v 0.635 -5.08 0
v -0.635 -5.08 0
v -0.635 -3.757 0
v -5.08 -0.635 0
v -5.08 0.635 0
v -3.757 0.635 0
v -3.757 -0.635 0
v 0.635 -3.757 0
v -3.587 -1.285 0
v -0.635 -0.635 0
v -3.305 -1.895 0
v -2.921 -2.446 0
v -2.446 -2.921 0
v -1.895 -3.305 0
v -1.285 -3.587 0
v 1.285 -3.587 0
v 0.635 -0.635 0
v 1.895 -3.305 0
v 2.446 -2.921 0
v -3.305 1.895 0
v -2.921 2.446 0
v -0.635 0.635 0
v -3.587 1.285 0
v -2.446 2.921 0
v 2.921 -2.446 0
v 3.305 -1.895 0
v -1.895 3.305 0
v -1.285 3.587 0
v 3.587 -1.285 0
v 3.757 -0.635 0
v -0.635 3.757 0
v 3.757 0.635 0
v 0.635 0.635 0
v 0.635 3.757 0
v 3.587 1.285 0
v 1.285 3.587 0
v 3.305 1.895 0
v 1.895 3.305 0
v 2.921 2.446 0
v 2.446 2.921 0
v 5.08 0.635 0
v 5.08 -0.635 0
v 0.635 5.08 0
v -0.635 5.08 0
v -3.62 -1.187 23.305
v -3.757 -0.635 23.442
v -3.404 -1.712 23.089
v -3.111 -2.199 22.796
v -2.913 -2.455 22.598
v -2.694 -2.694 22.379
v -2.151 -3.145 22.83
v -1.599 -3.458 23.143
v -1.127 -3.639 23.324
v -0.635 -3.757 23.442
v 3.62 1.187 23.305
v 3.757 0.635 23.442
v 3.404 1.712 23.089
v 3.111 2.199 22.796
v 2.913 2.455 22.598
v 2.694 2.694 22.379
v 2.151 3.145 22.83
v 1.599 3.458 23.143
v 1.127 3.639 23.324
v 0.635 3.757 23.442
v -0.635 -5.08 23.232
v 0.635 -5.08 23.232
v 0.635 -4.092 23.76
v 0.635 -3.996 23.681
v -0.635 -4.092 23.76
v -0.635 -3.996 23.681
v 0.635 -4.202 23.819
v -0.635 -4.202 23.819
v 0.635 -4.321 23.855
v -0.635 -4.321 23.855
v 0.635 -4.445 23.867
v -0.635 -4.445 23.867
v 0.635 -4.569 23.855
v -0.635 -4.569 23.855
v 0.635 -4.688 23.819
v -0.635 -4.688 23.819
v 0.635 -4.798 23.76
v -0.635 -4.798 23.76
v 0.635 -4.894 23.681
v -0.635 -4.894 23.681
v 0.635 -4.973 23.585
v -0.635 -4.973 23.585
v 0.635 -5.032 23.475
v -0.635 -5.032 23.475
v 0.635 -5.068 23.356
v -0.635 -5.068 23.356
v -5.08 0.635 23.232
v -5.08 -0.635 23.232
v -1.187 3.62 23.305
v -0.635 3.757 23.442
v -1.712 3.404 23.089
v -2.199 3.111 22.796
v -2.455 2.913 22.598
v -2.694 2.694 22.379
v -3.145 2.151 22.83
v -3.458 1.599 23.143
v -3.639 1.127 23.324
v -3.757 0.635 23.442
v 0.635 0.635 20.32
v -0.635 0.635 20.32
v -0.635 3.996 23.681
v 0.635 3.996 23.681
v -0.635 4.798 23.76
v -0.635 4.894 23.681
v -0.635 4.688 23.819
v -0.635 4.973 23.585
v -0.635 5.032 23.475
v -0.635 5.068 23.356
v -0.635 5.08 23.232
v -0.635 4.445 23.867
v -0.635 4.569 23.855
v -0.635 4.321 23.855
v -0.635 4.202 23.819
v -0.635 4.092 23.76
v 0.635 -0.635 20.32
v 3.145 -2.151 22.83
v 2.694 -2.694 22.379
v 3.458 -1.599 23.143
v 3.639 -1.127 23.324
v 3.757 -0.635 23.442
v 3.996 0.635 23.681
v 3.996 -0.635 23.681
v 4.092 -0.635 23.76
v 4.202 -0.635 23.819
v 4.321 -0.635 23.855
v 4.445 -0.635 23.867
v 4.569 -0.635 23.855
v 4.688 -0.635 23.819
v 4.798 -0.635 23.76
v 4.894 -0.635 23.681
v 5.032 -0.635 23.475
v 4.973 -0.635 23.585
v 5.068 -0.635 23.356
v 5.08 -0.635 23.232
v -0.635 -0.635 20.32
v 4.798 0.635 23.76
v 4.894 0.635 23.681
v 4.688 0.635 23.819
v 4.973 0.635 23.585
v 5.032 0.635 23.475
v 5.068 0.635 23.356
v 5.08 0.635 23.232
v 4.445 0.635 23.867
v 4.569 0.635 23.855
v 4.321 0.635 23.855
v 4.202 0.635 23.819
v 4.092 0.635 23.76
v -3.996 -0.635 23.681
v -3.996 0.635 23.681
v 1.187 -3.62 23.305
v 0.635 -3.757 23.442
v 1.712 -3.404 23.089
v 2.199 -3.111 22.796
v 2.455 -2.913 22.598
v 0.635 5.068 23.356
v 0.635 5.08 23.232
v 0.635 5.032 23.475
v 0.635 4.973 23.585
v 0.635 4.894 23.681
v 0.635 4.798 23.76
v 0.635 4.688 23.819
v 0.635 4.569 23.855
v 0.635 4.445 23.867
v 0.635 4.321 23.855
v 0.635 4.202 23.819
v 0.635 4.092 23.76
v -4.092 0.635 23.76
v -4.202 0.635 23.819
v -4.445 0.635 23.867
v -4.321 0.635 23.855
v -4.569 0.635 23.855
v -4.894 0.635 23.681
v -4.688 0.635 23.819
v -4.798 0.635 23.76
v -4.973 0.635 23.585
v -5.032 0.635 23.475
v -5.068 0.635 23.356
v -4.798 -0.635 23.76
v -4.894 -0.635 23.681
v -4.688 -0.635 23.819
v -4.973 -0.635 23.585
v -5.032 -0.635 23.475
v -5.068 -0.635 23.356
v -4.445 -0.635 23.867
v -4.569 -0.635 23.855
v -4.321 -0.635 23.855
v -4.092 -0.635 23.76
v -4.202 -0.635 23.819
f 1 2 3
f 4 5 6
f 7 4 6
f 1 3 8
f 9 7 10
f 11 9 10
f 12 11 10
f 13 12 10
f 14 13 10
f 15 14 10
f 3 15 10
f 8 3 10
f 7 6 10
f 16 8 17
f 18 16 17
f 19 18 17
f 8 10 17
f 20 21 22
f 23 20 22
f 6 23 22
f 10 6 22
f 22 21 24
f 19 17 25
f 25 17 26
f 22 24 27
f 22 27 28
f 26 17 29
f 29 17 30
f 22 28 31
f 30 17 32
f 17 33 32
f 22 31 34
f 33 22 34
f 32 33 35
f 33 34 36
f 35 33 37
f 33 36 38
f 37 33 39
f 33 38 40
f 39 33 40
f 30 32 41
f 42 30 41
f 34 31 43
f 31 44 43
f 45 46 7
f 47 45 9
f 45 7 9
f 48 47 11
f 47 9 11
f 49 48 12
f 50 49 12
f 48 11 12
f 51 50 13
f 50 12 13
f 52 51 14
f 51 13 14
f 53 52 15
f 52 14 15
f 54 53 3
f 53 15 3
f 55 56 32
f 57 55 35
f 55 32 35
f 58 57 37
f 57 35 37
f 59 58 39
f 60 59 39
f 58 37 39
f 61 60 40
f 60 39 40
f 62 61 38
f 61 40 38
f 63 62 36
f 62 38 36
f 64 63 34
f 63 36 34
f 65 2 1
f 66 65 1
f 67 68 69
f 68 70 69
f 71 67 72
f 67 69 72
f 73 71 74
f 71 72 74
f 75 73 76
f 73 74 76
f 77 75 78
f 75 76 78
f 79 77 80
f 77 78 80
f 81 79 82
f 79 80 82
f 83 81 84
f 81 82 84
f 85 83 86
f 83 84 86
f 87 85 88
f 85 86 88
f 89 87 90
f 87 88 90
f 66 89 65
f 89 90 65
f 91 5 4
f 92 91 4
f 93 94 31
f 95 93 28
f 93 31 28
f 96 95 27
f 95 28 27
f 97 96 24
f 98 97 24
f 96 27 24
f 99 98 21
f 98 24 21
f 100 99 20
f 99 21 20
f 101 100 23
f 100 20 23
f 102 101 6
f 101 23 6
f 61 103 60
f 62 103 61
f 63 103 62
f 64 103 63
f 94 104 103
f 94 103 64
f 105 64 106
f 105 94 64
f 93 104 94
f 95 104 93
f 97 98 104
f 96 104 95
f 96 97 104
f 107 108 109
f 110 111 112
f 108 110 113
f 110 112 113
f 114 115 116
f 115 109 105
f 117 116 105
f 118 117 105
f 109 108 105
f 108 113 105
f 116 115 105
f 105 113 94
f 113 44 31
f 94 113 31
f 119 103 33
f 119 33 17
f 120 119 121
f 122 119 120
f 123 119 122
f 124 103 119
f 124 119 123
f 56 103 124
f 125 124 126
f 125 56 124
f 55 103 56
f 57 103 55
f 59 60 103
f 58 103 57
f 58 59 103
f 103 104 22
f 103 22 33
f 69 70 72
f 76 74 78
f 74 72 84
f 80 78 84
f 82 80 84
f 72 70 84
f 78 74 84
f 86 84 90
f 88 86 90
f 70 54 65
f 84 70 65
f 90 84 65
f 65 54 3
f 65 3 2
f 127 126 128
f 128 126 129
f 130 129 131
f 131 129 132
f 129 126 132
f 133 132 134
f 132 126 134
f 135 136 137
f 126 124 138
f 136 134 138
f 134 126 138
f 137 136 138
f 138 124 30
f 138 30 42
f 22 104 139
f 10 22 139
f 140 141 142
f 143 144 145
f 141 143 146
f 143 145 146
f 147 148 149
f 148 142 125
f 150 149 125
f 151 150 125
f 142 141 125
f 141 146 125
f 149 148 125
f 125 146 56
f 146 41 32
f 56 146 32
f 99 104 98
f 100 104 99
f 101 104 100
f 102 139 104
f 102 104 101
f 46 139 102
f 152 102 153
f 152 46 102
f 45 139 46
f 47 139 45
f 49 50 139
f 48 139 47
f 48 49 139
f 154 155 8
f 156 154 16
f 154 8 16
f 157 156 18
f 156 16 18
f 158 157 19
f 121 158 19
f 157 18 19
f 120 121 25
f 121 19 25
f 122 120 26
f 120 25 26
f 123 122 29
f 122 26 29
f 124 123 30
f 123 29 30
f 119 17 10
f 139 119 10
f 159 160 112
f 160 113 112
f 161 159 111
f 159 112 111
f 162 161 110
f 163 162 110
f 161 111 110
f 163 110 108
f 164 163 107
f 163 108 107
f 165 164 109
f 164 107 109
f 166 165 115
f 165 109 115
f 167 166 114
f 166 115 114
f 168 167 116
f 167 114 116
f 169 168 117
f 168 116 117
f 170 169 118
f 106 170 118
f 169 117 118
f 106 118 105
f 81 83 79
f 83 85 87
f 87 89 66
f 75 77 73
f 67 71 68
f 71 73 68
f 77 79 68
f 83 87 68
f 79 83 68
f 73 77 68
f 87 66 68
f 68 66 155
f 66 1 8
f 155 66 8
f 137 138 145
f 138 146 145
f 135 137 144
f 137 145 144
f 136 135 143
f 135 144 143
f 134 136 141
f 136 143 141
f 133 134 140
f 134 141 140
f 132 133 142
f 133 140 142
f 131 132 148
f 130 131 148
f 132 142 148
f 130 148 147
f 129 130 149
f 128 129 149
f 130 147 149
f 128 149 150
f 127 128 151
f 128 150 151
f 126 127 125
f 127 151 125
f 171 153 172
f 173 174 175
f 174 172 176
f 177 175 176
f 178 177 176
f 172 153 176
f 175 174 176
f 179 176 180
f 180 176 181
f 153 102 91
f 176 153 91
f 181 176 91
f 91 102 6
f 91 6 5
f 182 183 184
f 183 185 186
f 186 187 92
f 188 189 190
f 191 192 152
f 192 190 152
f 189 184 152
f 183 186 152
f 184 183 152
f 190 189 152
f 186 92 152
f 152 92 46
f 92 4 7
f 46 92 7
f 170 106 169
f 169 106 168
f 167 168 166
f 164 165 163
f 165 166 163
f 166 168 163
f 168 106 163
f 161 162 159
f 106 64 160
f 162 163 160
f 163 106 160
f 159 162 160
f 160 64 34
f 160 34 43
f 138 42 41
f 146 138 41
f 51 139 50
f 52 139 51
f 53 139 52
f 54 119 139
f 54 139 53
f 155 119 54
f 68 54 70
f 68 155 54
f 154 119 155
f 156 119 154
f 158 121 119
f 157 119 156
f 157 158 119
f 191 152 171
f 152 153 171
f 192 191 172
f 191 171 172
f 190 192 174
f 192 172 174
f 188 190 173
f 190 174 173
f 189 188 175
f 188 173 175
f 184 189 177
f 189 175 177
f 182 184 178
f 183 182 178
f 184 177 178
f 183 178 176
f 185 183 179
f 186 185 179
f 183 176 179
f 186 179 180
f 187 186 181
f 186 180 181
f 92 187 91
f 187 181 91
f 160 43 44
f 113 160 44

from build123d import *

# Parameters (mm, degrees)
F1_DEPTH     = 25.4
F2_T1_DEPTH  = 1.27
F2_T3_DEPTH  = 1.27
F2_T9_DEPTH  = 14.3341495789
F2_S10_R     = 3.81
F2_T11_DEPTH = 10
F2_T15_DEPTH = 14.3341495789
F2_S16_R     = 3.81
F2_T17_DEPTH = 10
F2_T24_DEPTH = 14.3341495789
F2_S25_R     = 3.81
F2_T26_DEPTH = 10
F2_T30_DEPTH = 14.3341495789
F2_S31_R     = 3.81
F2_T32_DEPTH = 10
F2_T39_DEPTH = 14.3341495789
F2_S40_R     = 3.81
F2_T41_DEPTH = 10
F2_T45_DEPTH = 14.3341495789
F2_S46_R     = 3.81
F2_T47_DEPTH = 10
F2_T54_DEPTH = 14.3341495789
F2_S55_R     = 3.81
F2_T56_DEPTH = 10
F2_T60_DEPTH = 14.3341495789
F2_S61_R     = 3.81
F2_T62_DEPTH = 10
F3_R         = 0.635


# Not quite as in the source:
# - a fillet or chamfer that OpenCascade refuses, or shapes differently, is made with other operations: its cross-section is extruded or revolved along the edge and cut away or added


with BuildPart() as f1:
    # F0 (on Top) → F1 (new body)
    with BuildSketch(Plane.XY):
        with BuildLine():
            ThreePointArc((3.7567106623, -0.635), (3.7966542918, -0.3186160517), (3.81, 0))
            ThreePointArc((3.81, 0), (3.7966542918, 0.3186160517), (3.7567106623, 0.635))
            Line((3.7567106623, 0.635), (0.635, 0.635))
            Line((0.635, 0.635), (0.635, -0.635))
            Line((0.635, -0.635), (3.7567106623, -0.635))
        make_face()
        with BuildLine():
            ThreePointArc((3.7567106623, 0.635), (3.7966542918, 0.3186160517), (3.81, 0))
            ThreePointArc((3.81, 0), (3.7966542918, -0.3186160517), (3.7567106623, -0.635))
            Line((3.7567106623, -0.635), (5.08, -0.635))
            Line((5.08, -0.635), (5.08, 0.635))
            Line((5.08, 0.635), (3.7567106623, 0.635))
        make_face()
        with BuildLine():
            Line((0.635, 0.635), (3.7567106623, 0.635))
            ThreePointArc((3.7567106623, 0.635), (2.6940768363, 2.6940768363), (0.635, 3.7567106623))
            Line((0.635, 3.7567106623), (0.635, 0.635))
        make_face()
        with BuildLine():
            ThreePointArc((0.635, -3.7567106623), (2.6940768363, -2.6940768363), (3.7567106623, -0.635))
            Line((3.7567106623, -0.635), (0.635, -0.635))
            Line((0.635, -0.635), (0.635, -3.7567106623))
        make_face()
        with BuildLine():
            Line((0.635, 0.635), (0.635, 3.7567106623))
            ThreePointArc((0.635, 3.7567106623), (0, 3.81), (-0.635, 3.7567106623))
            Line((-0.635, 3.7567106623), (-0.635, 0.635))
            Line((-0.635, 0.635), (0.635, 0.635))
        make_face()
        with BuildLine():
            ThreePointArc((-0.635, 3.7567106623), (0, 3.81), (0.635, 3.7567106623))
            Line((0.635, 3.7567106623), (0.635, 5.08))
            Line((0.635, 5.08), (-0.635, 5.08))
            Line((-0.635, 5.08), (-0.635, 3.7567106623))
        make_face()
        with BuildLine():
            Line((0.635, -5.08), (0.635, -3.7567106623))
            ThreePointArc((0.635, -3.7567106623), (0, -3.81), (-0.635, -3.7567106623))
            Line((-0.635, -3.7567106623), (-0.635, -5.08))
            Line((-0.635, -5.08), (0.635, -5.08))
        make_face()
        with BuildLine():
            ThreePointArc((-0.635, -3.7567106623), (0, -3.81), (0.635, -3.7567106623))
            Line((0.635, -3.7567106623), (0.635, -0.635))
            Line((0.635, -0.635), (-0.635, -0.635))
            Line((-0.635, -0.635), (-0.635, -3.7567106623))
        make_face()
        with BuildLine():
            Line((-0.635, 0.635), (-0.635, 3.7567106623))
            ThreePointArc((-0.635, 3.7567106623), (-2.6940768363, 2.6940768363), (-3.7567106623, 0.635))
            Line((-3.7567106623, 0.635), (-0.635, 0.635))
        make_face()
        with BuildLine():
            Line((-0.635, -0.635), (-0.635, 0.635))
            Line((-0.635, 0.635), (-3.7567106623, 0.635))
            ThreePointArc((-3.7567106623, 0.635), (-3.81, 0), (-3.7567106623, -0.635))
            Line((-3.7567106623, -0.635), (-0.635, -0.635))
        make_face()
        with BuildLine():
            ThreePointArc((-3.7567106623, -0.635), (-2.6940768363, -2.6940768363), (-0.635, -3.7567106623))
            Line((-0.635, -3.7567106623), (-0.635, -0.635))
            Line((-0.635, -0.635), (-3.7567106623, -0.635))
        make_face()
        with BuildLine():
            ThreePointArc((-3.7567106623, -0.635), (-3.81, 0), (-3.7567106623, 0.635))
            Line((-3.7567106623, 0.635), (-5.08, 0.635))
            Line((-5.08, 0.635), (-5.08, -0.635))
            Line((-5.08, -0.635), (-3.7567106623, -0.635))
        make_face()
    extrude(amount=F1_DEPTH)

    # F2: chamfer of 5.08 on 4 edges, made by hand

    # F2_s2 → F2_t1 (cut)
    with BuildSketch(Plane.YZ.offset(-0.635)):
        Polygon((0.635, 20.32), (5.715, 25.4), (0.635, 25.4), align=None)
        Polygon((-0.635, 20.32), (-5.715, 25.4), (-0.635, 25.4), align=None)
    extrude(amount=F2_T1_DEPTH, mode=Mode.SUBTRACT)

    # F2_s4 → F2_t3 (cut)
    with BuildSketch(Plane.XZ.offset(-0.635)):
        Polygon((-0.635, 20.32), (-5.715, 25.4), (-0.635, 25.4), align=None)
        Polygon((0.635, 20.32), (5.715, 25.4), (0.635, 25.4), align=None)
    extrude(amount=F2_T3_DEPTH, mode=Mode.SUBTRACT)


with BuildPart() as f2_tool7:
    # F2_s8 → F2_t9 (new body)
    with BuildSketch(Plane.XZ.offset(0.635)):
        Polygon((-0.635, 20.32), (-5.715, 25.4), (-0.635, 25.4), align=None)
    extrude(amount=-F2_T9_DEPTH)

    # F2_s10 → F2_t11 (intersect, symmetric)
    with BuildSketch(Plane.XY.offset(22.9)):
        Circle(F2_S10_R)
    extrude(amount=F2_T11_DEPTH, both=True, mode=Mode.INTERSECT)

    split(bisect_by=Plane.XZ.offset(-0.635), keep=Keep.BOTTOM)


with BuildPart() as f2_tool13:
    # F2_s14 → F2_t15 (new body)
    with BuildSketch(Plane.YZ.offset(-13.6991495789)):
        Polygon((0.635, 20.32), (5.715, 25.4), (0.635, 25.4), align=None)
    extrude(amount=F2_T15_DEPTH)

    # F2_s16 → F2_t17 (intersect, symmetric)
    with BuildSketch(Plane.XY.offset(22.9)):
        Circle(F2_S16_R)
    extrude(amount=F2_T17_DEPTH, both=True, mode=Mode.INTERSECT)

    split(bisect_by=Plane.YZ.offset(-0.635), keep=Keep.BOTTOM)


with BuildPart() as f2_tool7_1:
    add(f2_tool7.part)

    # F2_t19: intersect F2_tool13
    add(f2_tool13.part, mode=Mode.INTERSECT)


with BuildPart() as f1_1:
    add(f1.part)

    # F2_t5: cut F2_tool7
    add(f2_tool7_1.part, mode=Mode.SUBTRACT)


with BuildPart() as f2_tool22:
    # F2_s23 → F2_t24 (new body)
    with BuildSketch(Plane.YZ.offset(-0.635)):
        Polygon((0.635, 20.32), (5.715, 25.4), (0.635, 25.4), align=None)
    extrude(amount=F2_T24_DEPTH)

    # F2_s25 → F2_t26 (intersect, symmetric)
    with BuildSketch(Plane.XY.offset(22.9)):
        Circle(F2_S25_R)
    extrude(amount=F2_T26_DEPTH, both=True, mode=Mode.INTERSECT)

    split(bisect_by=Plane.YZ.offset(0.635), keep=Keep.TOP)


with BuildPart() as f2_tool28:
    # F2_s29 → F2_t30 (new body)
    with BuildSketch(Plane.XZ.offset(-13.6991495789)):
        Polygon((0.635, 20.32), (5.715, 25.4), (0.635, 25.4), align=None)
    extrude(amount=F2_T30_DEPTH)

    # F2_s31 → F2_t32 (intersect, symmetric)
    with BuildSketch(Plane.XY.offset(22.9)):
        Circle(F2_S31_R)
    extrude(amount=F2_T32_DEPTH, both=True, mode=Mode.INTERSECT)

    split(bisect_by=Plane.XZ.offset(-0.635), keep=Keep.BOTTOM)


with BuildPart() as f2_tool22_1:
    add(f2_tool22.part)

    # F2_t34: intersect F2_tool28
    add(f2_tool28.part, mode=Mode.INTERSECT)


with BuildPart() as f1_2:
    add(f1_1.part)

    # F2_t20: cut F2_tool22
    add(f2_tool22_1.part, mode=Mode.SUBTRACT)


with BuildPart() as f2_tool37:
    # F2_s38 → F2_t39 (new body)
    with BuildSketch(Plane.YZ.offset(0.635)):
        Polygon((-0.635, 20.32), (-5.715, 25.4), (-0.635, 25.4), align=None)
    extrude(amount=-F2_T39_DEPTH)

    # F2_s40 → F2_t41 (intersect, symmetric)
    with BuildSketch(Plane.XY.offset(22.9)):
        Circle(F2_S40_R)
    extrude(amount=F2_T41_DEPTH, both=True, mode=Mode.INTERSECT)

    split(bisect_by=Plane.YZ.offset(-0.635), keep=Keep.BOTTOM)


with BuildPart() as f2_tool43:
    # F2_s44 → F2_t45 (new body)
    with BuildSketch(Plane.XZ.offset(13.6991495789)):
        Polygon((-0.635, 20.32), (-5.715, 25.4), (-0.635, 25.4), align=None)
    extrude(amount=-F2_T45_DEPTH)

    # F2_s46 → F2_t47 (intersect, symmetric)
    with BuildSketch(Plane.XY.offset(22.9)):
        Circle(F2_S46_R)
    extrude(amount=F2_T47_DEPTH, both=True, mode=Mode.INTERSECT)

    split(bisect_by=Plane.XZ.offset(0.635), keep=Keep.TOP)


with BuildPart() as f2_tool37_1:
    add(f2_tool37.part)

    # F2_t49: intersect F2_tool43
    add(f2_tool43.part, mode=Mode.INTERSECT)


with BuildPart() as f1_3:
    add(f1_2.part)

    # F2_t35: cut F2_tool37
    add(f2_tool37_1.part, mode=Mode.SUBTRACT)


with BuildPart() as f2_tool52:
    # F2_s53 → F2_t54 (new body)
    with BuildSketch(Plane.YZ.offset(13.6991495789)):
        Polygon((-0.635, 20.32), (-5.715, 25.4), (-0.635, 25.4), align=None)
    extrude(amount=-F2_T54_DEPTH)

    # F2_s55 → F2_t56 (intersect, symmetric)
    with BuildSketch(Plane.XY.offset(22.9)):
        Circle(F2_S55_R)
    extrude(amount=F2_T56_DEPTH, both=True, mode=Mode.INTERSECT)

    split(bisect_by=Plane.YZ.offset(0.635), keep=Keep.TOP)


with BuildPart() as f2_tool58:
    # F2_s59 → F2_t60 (new body)
    with BuildSketch(Plane.XZ.offset(-0.635)):
        Polygon((0.635, 20.32), (5.715, 25.4), (0.635, 25.4), align=None)
    extrude(amount=F2_T60_DEPTH)

    # F2_s61 → F2_t62 (intersect, symmetric)
    with BuildSketch(Plane.XY.offset(22.9)):
        Circle(F2_S61_R)
    extrude(amount=F2_T62_DEPTH, both=True, mode=Mode.INTERSECT)

    split(bisect_by=Plane.XZ.offset(0.635), keep=Keep.TOP)


with BuildPart() as f2_tool52_1:
    add(f2_tool52.part)

    # F2_t64: intersect F2_tool58
    add(f2_tool58.part, mode=Mode.INTERSECT)


with BuildPart() as f1_4:
    add(f1_3.part)

    # F2_t50: cut F2_tool52
    add(f2_tool52_1.part, mode=Mode.SUBTRACT)

    # F3
    f3_edges = [f1_4.edges().sort_by_distance(p)[0] for p in [
        (5.08, 0, 24.765),
        (0, 5.08, 24.765),
        (-5.08, 0, 24.765),
        (0, -5.08, 24.765),
    ]]
    fillet(f3_edges, radius=F3_R)


solid = f1_4.part
